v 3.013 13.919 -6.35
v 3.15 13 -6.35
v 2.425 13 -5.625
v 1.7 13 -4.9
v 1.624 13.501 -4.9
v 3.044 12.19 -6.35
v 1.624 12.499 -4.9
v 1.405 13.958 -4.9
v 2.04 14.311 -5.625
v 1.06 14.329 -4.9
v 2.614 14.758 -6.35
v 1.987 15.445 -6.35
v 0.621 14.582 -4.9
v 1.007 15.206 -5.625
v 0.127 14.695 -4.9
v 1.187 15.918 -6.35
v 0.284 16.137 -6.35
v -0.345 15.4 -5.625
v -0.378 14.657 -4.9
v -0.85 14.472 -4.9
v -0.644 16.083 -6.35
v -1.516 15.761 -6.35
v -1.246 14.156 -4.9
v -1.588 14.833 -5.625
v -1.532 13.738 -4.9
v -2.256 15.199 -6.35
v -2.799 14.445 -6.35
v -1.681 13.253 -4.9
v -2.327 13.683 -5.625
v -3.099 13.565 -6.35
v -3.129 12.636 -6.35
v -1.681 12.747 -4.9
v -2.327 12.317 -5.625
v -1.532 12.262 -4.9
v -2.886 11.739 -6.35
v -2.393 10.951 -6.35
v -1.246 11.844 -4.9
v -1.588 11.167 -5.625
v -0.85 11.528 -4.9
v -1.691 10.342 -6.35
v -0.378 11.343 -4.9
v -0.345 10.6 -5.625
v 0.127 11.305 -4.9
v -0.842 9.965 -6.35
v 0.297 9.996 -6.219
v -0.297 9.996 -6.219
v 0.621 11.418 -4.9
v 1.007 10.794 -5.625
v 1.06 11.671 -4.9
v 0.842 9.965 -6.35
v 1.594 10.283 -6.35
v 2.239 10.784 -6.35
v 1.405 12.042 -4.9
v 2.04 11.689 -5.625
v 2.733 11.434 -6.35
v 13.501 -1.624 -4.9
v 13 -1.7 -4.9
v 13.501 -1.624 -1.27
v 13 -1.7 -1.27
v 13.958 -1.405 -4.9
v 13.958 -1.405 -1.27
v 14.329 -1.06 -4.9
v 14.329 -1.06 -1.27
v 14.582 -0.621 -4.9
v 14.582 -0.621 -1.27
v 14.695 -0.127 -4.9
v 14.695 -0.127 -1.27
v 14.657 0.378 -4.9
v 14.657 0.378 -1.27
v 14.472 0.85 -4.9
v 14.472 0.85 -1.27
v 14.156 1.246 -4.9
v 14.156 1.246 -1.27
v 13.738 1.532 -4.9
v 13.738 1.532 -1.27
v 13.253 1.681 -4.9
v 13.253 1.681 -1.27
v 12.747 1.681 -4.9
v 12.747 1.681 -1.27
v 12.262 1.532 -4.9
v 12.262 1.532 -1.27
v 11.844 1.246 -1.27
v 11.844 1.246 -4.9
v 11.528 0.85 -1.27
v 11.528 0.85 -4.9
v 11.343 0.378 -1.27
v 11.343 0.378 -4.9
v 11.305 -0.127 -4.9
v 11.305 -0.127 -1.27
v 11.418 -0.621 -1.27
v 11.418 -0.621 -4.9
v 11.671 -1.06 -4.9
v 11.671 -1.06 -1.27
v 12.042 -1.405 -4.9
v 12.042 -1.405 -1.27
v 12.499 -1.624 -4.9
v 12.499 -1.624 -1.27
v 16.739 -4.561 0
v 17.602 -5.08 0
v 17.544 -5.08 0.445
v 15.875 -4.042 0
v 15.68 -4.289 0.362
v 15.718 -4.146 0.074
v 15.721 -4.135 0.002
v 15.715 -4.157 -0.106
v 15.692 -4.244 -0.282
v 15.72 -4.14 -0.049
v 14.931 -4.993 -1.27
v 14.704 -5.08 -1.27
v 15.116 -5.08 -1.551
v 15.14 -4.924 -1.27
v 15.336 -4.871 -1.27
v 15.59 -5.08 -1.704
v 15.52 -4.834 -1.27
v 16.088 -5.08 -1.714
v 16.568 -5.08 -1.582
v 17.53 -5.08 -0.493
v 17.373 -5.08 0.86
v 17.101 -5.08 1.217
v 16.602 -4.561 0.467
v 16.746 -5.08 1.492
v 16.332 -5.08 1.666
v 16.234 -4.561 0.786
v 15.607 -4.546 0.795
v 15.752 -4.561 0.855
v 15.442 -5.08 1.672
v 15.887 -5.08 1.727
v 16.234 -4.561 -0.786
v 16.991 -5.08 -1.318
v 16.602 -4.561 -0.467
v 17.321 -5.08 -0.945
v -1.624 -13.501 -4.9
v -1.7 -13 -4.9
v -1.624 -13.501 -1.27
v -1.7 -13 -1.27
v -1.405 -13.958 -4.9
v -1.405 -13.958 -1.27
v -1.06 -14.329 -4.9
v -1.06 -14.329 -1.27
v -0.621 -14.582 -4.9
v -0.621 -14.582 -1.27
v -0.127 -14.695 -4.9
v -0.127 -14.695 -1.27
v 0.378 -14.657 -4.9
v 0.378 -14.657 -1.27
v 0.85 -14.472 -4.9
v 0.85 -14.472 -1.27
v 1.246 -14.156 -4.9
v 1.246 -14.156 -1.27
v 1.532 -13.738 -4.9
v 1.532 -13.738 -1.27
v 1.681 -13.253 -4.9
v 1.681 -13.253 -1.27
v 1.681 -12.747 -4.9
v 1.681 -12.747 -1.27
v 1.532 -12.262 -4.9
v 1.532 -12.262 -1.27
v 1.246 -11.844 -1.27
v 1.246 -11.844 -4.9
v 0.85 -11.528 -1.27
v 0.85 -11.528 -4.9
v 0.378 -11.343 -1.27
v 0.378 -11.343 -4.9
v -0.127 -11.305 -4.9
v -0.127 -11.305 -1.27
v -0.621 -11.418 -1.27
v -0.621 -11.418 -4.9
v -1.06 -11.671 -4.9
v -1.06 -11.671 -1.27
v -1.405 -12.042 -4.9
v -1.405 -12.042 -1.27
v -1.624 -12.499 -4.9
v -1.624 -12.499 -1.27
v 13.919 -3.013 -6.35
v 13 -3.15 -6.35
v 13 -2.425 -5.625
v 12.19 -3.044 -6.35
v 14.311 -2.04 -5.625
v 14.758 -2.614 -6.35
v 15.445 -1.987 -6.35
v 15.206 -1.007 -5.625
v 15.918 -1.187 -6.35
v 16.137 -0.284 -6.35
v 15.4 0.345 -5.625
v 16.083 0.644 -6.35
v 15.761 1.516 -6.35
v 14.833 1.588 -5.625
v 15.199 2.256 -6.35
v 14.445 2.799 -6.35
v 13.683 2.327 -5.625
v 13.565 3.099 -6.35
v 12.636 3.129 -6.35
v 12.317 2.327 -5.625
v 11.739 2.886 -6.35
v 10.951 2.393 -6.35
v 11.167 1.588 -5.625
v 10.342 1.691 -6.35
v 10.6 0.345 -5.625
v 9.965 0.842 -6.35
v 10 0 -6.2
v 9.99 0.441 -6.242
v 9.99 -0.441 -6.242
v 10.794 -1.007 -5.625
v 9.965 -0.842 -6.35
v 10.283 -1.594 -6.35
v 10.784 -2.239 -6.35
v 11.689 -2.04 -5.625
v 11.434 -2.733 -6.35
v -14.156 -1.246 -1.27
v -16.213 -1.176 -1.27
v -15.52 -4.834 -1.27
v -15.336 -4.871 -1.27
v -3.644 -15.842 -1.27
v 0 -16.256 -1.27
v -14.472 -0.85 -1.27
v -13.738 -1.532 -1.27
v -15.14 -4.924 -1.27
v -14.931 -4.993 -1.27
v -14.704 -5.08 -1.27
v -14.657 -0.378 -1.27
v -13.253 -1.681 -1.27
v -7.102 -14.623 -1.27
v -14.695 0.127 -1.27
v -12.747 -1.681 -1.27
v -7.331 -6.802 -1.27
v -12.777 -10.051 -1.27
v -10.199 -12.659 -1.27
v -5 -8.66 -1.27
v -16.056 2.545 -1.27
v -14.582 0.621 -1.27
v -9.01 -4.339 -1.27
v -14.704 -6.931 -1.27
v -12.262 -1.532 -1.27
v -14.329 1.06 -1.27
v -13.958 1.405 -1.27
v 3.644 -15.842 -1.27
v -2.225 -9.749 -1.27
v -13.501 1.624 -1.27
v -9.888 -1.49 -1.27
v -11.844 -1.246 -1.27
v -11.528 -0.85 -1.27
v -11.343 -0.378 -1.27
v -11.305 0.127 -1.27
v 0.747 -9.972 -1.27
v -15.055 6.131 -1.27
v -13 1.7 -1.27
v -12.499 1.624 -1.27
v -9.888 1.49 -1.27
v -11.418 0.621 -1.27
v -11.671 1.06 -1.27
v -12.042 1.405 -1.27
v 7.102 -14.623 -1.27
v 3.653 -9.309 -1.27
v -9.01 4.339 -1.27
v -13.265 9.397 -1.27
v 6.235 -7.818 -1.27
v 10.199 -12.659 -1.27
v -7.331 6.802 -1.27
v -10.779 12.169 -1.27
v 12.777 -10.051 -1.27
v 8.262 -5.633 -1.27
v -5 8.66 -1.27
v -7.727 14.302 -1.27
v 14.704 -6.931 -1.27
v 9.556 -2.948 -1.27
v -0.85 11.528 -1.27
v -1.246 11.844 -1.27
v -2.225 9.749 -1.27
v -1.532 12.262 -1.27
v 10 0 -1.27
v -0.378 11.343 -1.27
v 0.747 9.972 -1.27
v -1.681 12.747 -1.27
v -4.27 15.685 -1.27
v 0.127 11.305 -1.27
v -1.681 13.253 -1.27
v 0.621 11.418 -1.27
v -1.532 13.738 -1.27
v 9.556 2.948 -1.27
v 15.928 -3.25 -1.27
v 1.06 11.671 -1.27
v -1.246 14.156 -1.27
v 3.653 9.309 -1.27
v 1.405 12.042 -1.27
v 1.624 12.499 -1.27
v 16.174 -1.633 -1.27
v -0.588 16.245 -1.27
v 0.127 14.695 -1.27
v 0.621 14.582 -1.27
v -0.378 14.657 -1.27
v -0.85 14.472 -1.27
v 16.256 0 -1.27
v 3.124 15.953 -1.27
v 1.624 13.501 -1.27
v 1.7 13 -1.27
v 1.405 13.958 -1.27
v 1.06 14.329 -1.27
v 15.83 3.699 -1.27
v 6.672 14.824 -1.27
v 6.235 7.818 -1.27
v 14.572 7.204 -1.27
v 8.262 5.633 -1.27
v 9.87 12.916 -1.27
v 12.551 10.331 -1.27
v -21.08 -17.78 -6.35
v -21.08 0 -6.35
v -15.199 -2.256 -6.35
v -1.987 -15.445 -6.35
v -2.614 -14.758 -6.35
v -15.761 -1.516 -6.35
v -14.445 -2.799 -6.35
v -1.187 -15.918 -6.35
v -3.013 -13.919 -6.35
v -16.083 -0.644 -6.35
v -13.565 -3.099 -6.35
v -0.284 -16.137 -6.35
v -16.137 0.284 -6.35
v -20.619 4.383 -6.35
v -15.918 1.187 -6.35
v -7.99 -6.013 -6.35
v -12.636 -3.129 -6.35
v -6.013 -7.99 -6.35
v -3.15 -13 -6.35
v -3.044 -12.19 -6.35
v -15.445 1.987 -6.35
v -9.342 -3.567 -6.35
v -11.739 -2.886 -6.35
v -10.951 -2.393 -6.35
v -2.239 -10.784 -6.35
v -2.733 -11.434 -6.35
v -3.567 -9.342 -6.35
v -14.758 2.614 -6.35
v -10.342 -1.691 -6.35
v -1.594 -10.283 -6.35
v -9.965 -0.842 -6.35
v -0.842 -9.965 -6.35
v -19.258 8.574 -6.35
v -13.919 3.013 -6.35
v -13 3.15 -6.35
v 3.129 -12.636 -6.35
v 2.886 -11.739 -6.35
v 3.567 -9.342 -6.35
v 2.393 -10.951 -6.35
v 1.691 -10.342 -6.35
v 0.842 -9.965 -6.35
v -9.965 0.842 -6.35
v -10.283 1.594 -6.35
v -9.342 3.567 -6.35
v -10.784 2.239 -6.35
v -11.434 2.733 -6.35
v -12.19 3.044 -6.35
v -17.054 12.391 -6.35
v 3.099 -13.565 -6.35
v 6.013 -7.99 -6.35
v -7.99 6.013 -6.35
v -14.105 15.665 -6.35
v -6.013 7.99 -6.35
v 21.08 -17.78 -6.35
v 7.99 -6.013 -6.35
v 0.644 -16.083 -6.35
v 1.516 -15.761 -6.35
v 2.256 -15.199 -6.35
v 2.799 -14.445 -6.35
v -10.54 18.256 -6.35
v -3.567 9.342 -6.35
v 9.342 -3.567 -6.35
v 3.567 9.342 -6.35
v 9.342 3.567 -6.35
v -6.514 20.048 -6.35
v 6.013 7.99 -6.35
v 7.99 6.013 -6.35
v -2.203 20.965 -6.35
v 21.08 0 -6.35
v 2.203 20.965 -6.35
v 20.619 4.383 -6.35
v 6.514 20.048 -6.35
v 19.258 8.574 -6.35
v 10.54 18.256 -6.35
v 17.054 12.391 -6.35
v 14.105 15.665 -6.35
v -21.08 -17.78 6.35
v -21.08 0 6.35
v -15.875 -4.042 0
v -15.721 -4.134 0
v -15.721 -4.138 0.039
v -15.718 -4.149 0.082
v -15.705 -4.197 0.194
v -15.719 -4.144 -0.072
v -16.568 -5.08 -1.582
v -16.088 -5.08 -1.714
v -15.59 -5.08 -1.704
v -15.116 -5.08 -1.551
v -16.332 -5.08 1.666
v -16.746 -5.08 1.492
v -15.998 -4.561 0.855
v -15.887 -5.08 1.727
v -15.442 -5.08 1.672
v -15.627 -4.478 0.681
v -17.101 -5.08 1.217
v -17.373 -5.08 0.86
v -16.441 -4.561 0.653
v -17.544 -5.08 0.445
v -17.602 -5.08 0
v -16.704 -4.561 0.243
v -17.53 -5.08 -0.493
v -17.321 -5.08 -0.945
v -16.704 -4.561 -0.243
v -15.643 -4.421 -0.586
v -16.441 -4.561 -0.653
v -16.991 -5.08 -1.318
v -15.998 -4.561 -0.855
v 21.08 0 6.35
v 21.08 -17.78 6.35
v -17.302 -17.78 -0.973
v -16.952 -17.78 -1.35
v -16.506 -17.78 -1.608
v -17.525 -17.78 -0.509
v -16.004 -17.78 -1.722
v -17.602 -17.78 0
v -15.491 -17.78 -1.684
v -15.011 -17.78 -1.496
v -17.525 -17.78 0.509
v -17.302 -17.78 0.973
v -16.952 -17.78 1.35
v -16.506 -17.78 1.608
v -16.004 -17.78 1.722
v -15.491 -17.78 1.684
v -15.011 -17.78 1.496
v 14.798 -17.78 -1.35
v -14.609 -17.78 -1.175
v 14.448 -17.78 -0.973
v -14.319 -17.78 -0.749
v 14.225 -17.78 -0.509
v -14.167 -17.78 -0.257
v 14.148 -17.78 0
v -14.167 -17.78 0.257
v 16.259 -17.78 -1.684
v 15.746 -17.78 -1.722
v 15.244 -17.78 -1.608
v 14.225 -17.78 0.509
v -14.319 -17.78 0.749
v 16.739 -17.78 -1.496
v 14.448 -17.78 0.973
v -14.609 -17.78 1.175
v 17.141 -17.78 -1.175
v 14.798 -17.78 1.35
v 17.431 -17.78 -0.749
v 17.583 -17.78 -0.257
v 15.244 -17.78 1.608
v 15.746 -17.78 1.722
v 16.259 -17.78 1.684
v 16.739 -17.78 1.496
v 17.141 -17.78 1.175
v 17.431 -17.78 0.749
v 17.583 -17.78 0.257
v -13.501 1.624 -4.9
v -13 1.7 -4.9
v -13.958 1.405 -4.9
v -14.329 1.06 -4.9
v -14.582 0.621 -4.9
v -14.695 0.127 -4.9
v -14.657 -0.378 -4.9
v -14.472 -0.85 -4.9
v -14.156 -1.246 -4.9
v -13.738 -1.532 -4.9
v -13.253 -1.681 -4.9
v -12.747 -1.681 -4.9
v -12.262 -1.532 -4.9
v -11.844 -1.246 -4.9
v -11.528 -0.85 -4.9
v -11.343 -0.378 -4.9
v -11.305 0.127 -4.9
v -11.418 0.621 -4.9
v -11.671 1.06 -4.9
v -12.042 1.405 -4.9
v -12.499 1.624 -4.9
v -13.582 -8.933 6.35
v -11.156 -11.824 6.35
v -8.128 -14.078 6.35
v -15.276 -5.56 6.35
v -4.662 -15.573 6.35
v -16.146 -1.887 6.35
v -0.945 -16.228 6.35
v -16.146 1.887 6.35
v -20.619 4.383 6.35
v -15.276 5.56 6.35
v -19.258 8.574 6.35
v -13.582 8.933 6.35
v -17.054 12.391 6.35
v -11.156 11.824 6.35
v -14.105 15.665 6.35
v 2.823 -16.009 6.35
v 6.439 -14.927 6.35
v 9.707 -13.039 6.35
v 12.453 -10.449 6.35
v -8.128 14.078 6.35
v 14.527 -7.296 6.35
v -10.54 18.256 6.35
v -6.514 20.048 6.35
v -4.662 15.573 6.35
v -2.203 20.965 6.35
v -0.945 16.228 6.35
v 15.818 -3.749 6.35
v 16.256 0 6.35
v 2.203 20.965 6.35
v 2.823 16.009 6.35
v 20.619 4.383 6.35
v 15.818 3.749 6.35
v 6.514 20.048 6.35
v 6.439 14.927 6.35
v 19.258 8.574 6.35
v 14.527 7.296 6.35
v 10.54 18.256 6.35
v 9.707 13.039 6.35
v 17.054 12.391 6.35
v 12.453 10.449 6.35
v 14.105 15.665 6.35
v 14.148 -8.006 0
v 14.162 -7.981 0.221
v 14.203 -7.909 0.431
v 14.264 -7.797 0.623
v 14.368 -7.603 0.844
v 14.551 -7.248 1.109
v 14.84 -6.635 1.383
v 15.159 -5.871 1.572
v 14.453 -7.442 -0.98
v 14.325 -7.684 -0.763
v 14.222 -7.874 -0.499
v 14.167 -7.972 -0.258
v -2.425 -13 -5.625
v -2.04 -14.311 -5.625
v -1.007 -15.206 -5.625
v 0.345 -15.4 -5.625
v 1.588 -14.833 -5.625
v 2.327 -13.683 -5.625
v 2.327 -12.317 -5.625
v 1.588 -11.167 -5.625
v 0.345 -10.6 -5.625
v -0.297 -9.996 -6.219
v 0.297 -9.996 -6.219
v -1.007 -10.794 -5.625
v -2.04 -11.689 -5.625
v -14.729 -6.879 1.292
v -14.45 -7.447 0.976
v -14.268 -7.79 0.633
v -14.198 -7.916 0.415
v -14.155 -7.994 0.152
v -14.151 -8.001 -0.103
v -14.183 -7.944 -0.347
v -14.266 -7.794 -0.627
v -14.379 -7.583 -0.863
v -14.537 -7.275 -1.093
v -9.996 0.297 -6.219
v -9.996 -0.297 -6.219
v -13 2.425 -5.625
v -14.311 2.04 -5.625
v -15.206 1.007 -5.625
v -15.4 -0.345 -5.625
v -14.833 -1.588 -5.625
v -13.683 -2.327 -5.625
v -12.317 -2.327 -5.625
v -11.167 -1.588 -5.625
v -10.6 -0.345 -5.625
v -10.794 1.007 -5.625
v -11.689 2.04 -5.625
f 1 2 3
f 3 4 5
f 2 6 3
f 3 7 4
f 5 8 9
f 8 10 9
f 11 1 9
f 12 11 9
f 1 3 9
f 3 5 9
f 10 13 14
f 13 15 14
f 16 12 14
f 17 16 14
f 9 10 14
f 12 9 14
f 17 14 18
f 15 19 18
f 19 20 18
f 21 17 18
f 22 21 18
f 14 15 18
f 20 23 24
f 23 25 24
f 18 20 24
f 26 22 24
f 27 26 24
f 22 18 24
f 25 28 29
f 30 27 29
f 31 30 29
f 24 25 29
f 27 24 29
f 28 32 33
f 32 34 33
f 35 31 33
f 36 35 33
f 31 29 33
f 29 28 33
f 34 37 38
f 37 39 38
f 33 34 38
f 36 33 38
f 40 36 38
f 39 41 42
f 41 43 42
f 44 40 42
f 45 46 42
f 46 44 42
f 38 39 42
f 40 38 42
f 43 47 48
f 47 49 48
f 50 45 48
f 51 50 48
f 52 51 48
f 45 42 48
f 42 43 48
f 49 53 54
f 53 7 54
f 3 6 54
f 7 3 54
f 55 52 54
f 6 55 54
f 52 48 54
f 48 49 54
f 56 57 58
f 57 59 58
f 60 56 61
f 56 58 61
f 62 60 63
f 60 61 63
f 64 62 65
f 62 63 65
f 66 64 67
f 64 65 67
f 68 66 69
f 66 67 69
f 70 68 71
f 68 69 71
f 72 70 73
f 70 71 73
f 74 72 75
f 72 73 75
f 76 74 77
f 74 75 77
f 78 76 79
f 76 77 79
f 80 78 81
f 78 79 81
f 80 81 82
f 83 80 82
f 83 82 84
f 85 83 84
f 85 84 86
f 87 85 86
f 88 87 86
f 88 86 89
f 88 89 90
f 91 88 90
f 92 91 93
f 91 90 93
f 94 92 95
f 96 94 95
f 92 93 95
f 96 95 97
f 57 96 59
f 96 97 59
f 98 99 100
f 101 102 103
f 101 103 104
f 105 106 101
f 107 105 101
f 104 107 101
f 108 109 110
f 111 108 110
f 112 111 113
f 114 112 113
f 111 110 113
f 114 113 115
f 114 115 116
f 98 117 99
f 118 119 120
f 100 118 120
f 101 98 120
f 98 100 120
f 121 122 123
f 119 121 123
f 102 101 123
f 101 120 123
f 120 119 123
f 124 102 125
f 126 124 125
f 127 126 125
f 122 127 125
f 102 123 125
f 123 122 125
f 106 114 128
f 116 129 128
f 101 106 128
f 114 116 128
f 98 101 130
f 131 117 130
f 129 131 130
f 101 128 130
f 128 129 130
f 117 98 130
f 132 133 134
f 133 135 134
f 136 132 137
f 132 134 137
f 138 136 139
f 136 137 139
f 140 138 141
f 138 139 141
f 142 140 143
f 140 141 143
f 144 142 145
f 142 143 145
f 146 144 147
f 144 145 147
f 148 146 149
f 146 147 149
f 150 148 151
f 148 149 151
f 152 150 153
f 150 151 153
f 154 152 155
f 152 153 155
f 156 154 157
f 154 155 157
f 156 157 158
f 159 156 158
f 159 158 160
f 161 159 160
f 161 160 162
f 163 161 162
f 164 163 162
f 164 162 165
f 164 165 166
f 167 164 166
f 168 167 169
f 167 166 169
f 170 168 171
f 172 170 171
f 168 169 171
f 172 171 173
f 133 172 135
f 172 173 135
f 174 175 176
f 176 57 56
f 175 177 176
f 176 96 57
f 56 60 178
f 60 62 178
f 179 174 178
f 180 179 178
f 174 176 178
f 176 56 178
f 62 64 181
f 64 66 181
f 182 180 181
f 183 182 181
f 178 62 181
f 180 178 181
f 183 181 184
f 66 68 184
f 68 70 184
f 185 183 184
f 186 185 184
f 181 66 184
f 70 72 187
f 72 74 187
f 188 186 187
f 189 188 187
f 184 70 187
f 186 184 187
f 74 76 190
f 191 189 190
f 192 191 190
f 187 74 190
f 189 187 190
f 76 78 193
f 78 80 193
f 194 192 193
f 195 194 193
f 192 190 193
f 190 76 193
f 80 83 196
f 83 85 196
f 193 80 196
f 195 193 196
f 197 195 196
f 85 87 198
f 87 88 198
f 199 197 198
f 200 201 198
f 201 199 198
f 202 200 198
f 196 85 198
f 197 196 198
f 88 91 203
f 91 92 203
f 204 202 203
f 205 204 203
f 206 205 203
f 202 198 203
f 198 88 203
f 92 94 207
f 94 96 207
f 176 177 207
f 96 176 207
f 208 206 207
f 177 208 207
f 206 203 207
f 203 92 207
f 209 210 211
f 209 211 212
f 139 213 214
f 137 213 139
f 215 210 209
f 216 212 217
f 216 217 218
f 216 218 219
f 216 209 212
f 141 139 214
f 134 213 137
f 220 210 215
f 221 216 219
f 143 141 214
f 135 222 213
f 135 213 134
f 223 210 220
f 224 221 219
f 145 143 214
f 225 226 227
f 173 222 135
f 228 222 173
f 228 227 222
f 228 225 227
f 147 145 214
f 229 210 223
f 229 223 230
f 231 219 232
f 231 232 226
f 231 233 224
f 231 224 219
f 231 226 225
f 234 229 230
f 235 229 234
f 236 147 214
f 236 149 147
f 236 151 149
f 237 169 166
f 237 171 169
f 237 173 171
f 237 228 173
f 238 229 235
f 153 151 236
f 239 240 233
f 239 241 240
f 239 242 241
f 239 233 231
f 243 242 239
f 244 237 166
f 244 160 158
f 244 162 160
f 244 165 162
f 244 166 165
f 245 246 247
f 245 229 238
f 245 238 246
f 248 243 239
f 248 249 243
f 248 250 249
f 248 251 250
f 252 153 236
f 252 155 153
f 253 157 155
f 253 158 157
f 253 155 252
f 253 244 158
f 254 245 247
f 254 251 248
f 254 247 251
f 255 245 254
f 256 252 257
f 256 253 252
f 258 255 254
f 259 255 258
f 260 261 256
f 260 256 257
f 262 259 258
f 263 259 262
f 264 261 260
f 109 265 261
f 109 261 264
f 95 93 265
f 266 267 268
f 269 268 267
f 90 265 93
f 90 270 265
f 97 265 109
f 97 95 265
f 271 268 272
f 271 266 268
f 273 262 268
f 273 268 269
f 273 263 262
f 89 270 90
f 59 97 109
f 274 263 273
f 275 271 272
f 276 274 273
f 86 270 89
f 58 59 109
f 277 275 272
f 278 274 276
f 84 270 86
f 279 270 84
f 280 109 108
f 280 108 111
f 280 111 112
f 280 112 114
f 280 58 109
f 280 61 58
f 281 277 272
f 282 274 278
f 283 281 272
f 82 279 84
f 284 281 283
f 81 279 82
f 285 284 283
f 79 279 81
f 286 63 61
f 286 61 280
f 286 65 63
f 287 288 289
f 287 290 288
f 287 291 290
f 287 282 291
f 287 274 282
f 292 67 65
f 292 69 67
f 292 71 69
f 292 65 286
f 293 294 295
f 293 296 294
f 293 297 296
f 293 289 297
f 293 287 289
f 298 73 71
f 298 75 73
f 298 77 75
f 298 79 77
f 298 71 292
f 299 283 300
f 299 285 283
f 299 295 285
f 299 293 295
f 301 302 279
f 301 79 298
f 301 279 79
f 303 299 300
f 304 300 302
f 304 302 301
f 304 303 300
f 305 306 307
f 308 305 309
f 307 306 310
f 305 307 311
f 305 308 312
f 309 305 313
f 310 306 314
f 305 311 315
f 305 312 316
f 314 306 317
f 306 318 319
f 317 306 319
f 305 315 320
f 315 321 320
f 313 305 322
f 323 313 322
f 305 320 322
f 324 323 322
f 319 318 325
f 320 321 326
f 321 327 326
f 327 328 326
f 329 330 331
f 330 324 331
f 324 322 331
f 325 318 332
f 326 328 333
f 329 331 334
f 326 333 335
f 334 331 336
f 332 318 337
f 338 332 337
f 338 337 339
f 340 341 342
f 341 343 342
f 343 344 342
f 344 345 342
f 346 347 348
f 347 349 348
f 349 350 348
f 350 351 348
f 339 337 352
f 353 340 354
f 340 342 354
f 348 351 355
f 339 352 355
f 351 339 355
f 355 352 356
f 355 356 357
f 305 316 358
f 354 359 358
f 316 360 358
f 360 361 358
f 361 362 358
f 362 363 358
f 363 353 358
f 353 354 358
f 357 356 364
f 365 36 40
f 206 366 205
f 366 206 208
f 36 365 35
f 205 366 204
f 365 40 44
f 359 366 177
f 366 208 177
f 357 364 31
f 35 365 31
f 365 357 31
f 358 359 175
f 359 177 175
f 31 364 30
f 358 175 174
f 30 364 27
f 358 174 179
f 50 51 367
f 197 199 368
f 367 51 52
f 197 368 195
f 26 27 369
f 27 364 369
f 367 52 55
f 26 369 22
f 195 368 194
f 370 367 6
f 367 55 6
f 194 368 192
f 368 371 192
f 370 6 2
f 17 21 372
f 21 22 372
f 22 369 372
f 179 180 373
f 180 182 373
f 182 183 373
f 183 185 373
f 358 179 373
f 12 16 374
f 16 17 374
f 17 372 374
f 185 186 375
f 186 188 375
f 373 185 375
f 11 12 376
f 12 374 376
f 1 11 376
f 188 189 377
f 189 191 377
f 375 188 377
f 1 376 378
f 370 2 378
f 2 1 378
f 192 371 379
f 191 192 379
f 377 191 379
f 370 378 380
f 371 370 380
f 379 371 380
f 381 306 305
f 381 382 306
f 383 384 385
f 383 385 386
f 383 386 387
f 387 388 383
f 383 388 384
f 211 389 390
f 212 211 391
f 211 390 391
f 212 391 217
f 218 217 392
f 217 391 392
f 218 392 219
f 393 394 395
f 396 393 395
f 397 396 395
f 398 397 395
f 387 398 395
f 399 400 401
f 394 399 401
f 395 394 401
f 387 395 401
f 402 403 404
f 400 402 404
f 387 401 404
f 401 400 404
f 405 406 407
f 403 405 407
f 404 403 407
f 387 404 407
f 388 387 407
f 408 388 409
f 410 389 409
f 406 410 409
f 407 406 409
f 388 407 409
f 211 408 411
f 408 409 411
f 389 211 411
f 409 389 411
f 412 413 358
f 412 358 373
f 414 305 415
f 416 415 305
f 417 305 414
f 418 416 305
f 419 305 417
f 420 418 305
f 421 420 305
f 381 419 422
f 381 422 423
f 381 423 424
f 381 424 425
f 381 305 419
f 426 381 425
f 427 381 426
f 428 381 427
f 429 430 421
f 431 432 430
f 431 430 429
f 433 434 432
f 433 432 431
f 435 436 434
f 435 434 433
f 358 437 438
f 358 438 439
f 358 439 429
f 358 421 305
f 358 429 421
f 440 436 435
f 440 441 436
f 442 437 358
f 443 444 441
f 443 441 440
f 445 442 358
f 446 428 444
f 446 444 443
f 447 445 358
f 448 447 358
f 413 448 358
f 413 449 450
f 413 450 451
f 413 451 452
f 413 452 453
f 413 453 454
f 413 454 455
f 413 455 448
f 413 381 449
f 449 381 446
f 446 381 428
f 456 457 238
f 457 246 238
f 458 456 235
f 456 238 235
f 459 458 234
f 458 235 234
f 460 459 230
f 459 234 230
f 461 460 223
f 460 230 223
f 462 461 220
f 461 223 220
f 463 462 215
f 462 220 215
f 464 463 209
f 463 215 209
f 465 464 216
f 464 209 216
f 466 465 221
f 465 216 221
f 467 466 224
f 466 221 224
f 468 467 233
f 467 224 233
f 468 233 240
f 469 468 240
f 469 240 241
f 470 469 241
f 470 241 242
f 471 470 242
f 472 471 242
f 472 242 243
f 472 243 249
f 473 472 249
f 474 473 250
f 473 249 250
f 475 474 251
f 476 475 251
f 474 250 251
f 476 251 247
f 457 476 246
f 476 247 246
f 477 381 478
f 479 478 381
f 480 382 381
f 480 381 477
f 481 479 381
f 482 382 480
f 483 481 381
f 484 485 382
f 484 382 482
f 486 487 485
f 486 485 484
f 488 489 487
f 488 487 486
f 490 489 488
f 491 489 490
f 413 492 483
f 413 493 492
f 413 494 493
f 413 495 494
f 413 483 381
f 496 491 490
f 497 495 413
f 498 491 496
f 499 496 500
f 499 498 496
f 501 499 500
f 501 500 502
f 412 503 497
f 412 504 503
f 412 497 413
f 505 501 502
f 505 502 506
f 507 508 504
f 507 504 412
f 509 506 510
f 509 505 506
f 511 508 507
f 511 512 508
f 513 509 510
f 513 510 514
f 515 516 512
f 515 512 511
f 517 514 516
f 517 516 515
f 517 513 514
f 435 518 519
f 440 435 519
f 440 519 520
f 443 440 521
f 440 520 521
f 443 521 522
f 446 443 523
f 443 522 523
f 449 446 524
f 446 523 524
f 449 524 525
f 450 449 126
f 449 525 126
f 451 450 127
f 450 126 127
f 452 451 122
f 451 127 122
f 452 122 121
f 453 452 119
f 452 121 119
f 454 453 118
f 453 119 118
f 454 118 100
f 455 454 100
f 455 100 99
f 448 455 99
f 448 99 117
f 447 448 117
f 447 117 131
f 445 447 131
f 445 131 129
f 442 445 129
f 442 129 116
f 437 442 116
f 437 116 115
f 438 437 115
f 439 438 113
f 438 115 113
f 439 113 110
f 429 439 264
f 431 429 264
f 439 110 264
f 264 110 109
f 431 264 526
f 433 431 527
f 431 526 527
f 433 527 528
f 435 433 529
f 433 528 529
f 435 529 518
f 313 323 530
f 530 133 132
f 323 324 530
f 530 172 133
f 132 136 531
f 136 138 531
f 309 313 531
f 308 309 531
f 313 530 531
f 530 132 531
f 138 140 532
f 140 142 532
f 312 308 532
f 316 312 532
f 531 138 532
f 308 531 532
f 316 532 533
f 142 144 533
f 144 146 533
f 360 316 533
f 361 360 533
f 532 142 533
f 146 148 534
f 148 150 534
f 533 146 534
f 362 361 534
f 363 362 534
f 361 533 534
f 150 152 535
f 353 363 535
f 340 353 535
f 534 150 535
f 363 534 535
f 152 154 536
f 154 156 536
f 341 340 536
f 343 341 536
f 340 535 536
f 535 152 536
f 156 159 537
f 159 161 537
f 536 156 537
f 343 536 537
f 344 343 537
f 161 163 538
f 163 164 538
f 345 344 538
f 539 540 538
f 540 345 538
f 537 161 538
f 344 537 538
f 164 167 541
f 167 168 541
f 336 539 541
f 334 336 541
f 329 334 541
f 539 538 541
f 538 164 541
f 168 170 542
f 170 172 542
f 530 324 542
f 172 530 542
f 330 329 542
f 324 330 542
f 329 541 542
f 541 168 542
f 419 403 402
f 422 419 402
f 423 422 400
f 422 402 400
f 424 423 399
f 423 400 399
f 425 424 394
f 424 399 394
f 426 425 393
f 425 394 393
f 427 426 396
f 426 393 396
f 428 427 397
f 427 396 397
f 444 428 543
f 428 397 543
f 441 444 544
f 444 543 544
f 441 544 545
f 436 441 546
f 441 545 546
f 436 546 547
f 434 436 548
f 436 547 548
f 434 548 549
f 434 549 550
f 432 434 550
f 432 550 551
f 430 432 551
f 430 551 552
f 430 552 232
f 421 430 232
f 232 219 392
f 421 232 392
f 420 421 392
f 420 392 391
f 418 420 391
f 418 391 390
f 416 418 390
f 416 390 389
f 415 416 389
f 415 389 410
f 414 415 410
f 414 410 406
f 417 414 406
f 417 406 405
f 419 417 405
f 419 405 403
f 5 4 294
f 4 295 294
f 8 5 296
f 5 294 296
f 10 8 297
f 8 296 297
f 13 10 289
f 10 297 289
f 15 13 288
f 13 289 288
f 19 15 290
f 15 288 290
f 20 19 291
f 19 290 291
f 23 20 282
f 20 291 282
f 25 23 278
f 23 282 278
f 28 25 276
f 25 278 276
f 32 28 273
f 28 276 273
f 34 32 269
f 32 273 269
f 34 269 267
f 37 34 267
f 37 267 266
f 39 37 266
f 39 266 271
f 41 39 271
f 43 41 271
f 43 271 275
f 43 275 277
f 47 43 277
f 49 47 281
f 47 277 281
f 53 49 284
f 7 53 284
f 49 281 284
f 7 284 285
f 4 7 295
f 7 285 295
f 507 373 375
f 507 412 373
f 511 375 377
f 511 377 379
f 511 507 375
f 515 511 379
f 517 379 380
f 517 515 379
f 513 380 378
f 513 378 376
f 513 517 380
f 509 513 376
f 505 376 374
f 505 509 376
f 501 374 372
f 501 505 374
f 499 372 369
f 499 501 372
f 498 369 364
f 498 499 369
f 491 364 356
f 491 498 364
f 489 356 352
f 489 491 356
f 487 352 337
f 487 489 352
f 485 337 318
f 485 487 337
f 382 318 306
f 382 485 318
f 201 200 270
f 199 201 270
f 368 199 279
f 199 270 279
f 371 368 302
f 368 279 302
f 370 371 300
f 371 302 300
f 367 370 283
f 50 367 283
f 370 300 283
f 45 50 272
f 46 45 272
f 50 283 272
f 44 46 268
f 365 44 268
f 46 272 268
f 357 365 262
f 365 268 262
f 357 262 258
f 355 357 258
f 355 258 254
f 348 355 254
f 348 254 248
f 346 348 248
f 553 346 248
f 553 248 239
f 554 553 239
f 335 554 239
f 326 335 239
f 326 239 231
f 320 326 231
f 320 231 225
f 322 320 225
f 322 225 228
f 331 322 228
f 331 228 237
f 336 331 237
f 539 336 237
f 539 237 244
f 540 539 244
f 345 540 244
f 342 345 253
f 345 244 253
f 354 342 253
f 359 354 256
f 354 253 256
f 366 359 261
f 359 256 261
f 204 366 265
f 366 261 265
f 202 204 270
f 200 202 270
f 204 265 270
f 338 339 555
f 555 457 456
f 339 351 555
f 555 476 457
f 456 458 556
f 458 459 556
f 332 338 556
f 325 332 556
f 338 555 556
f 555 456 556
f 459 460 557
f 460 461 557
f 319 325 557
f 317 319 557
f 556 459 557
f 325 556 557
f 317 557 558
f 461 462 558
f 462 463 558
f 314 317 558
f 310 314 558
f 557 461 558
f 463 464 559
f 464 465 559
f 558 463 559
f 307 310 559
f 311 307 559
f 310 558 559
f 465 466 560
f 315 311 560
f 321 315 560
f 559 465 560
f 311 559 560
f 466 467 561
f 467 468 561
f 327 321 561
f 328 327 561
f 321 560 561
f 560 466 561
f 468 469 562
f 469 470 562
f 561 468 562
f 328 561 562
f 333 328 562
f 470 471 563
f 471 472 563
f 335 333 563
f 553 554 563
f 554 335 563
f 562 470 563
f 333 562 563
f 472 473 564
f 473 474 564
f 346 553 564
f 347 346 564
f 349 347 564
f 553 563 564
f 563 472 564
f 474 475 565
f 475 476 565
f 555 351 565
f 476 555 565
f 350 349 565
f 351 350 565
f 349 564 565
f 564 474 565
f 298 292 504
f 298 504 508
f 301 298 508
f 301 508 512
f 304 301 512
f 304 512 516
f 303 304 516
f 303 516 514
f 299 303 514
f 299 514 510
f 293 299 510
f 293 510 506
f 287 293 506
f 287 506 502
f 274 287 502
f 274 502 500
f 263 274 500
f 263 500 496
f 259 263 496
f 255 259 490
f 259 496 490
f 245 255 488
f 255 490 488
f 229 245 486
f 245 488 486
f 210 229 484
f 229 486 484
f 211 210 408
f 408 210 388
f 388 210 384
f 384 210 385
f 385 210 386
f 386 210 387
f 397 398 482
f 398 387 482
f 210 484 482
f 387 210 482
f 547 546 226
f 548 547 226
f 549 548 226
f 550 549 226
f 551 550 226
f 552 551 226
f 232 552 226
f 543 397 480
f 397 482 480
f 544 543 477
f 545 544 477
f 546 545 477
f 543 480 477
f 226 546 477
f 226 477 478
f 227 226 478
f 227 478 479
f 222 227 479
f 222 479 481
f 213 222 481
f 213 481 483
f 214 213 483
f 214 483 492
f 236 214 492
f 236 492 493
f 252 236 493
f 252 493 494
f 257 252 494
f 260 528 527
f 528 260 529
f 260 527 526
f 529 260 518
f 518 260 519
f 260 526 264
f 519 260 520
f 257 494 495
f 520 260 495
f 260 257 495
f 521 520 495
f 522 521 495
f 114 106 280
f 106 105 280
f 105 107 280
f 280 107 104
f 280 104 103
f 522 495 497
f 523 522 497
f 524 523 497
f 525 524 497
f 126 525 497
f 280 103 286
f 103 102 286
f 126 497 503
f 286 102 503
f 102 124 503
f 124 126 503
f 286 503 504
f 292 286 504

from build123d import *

# Parameters (mm, degrees)
BOSS_EXTRUDE1_DEPTH                             = 6.35
SKETCH2_R                                       = 16.256
CUT_EXTRUDE1_DEPTH                              = 7.62
SKETCH3_R                                       = 10
CUT_EXTRUDE2_DEPTH                              = 31.770069873
CSK_FOR_M3_FLAT_HEAD_MACHINE_SCREW1_D           = 3.4
CSK_FOR_M3_FLAT_HEAD_MACHINE_SCREW1_CSINK_D     = 6.3
CSK_FOR_M3_FLAT_HEAD_MACHINE_SCREW1_CSINK_ANGLE = 90
CIRPATTERN1_COUNT                               = 4
F_8_32_TAPPED_HOLE1_D                           = 3.4544
F_8_32_TAPPED_HOLE1_DEPTH                       = 12.7
F_8_32_TAPPED_HOLE1_TIP                         = 1.037806461


with BuildPart() as part:
    # Sketch1 → Boss-Extrude1 (new, symmetric)
    with BuildSketch(Plane.XY):
        with BuildLine():
            Line((-21.08, 0), (-21.08, -17.78))
            Line((-21.08, -17.78), (21.08, -17.78))
            Line((21.08, -17.78), (21.08, 0))
            ThreePointArc((21.08, 0), (0, 21.08), (-21.08, 0))
        make_face()
    extrude(amount=BOSS_EXTRUDE1_DEPTH, both=True)

    # Sketch2 → Cut-Extrude1 (cut)
    with BuildSketch(Plane.XY.offset(6.35)):
        Circle(SKETCH2_R)
    extrude(amount=-CUT_EXTRUDE1_DEPTH, mode=Mode.SUBTRACT)

    # Sketch3 → Cut-Extrude2 (cut, through all)
    with BuildSketch(Plane.XY.offset(-1.27)):
        Circle(SKETCH3_R)
    extrude(amount=-CUT_EXTRUDE2_DEPTH, mode=Mode.SUBTRACT)

    # CSK for M3 Flat Head Machine Screw1 (through all)
    with Locations(Plane(origin=(0, 0, -6.35), x_dir=(-1, 0, 0), z_dir=(0, 0, -1))):
        with Locations((0, 13)):
            csk_for_m3_flat_head_machine_screw1 = CounterSinkHole(CSK_FOR_M3_FLAT_HEAD_MACHINE_SCREW1_D / 2, CSK_FOR_M3_FLAT_HEAD_MACHINE_SCREW1_CSINK_D / 2, counter_sink_angle=CSK_FOR_M3_FLAT_HEAD_MACHINE_SCREW1_CSINK_ANGLE)

    # CirPattern1: CSK for M3 Flat Head Machine Screw1 ×4 about axis
    cirpattern1_axis = Axis((0, 0, 0), (0, 0, 1))
    for i in range(1, CIRPATTERN1_COUNT):
        add(csk_for_m3_flat_head_machine_screw1.rotate(cirpattern1_axis, i * 360 / CIRPATTERN1_COUNT), mode=Mode.SUBTRACT)

    # #8-32 Tapped Hole1
    with Locations(Plane.XZ.offset(17.78)):
        with Locations((15.875, 0), (-15.875, 0)):
            Hole(F_8_32_TAPPED_HOLE1_D / 2, depth=F_8_32_TAPPED_HOLE1_DEPTH)
            with Locations((0, 0, -(F_8_32_TAPPED_HOLE1_DEPTH + F_8_32_TAPPED_HOLE1_TIP / 2))):  # 118° drill point
                Cone(0, F_8_32_TAPPED_HOLE1_D / 2, F_8_32_TAPPED_HOLE1_TIP, mode=Mode.SUBTRACT)


solid = part.part
